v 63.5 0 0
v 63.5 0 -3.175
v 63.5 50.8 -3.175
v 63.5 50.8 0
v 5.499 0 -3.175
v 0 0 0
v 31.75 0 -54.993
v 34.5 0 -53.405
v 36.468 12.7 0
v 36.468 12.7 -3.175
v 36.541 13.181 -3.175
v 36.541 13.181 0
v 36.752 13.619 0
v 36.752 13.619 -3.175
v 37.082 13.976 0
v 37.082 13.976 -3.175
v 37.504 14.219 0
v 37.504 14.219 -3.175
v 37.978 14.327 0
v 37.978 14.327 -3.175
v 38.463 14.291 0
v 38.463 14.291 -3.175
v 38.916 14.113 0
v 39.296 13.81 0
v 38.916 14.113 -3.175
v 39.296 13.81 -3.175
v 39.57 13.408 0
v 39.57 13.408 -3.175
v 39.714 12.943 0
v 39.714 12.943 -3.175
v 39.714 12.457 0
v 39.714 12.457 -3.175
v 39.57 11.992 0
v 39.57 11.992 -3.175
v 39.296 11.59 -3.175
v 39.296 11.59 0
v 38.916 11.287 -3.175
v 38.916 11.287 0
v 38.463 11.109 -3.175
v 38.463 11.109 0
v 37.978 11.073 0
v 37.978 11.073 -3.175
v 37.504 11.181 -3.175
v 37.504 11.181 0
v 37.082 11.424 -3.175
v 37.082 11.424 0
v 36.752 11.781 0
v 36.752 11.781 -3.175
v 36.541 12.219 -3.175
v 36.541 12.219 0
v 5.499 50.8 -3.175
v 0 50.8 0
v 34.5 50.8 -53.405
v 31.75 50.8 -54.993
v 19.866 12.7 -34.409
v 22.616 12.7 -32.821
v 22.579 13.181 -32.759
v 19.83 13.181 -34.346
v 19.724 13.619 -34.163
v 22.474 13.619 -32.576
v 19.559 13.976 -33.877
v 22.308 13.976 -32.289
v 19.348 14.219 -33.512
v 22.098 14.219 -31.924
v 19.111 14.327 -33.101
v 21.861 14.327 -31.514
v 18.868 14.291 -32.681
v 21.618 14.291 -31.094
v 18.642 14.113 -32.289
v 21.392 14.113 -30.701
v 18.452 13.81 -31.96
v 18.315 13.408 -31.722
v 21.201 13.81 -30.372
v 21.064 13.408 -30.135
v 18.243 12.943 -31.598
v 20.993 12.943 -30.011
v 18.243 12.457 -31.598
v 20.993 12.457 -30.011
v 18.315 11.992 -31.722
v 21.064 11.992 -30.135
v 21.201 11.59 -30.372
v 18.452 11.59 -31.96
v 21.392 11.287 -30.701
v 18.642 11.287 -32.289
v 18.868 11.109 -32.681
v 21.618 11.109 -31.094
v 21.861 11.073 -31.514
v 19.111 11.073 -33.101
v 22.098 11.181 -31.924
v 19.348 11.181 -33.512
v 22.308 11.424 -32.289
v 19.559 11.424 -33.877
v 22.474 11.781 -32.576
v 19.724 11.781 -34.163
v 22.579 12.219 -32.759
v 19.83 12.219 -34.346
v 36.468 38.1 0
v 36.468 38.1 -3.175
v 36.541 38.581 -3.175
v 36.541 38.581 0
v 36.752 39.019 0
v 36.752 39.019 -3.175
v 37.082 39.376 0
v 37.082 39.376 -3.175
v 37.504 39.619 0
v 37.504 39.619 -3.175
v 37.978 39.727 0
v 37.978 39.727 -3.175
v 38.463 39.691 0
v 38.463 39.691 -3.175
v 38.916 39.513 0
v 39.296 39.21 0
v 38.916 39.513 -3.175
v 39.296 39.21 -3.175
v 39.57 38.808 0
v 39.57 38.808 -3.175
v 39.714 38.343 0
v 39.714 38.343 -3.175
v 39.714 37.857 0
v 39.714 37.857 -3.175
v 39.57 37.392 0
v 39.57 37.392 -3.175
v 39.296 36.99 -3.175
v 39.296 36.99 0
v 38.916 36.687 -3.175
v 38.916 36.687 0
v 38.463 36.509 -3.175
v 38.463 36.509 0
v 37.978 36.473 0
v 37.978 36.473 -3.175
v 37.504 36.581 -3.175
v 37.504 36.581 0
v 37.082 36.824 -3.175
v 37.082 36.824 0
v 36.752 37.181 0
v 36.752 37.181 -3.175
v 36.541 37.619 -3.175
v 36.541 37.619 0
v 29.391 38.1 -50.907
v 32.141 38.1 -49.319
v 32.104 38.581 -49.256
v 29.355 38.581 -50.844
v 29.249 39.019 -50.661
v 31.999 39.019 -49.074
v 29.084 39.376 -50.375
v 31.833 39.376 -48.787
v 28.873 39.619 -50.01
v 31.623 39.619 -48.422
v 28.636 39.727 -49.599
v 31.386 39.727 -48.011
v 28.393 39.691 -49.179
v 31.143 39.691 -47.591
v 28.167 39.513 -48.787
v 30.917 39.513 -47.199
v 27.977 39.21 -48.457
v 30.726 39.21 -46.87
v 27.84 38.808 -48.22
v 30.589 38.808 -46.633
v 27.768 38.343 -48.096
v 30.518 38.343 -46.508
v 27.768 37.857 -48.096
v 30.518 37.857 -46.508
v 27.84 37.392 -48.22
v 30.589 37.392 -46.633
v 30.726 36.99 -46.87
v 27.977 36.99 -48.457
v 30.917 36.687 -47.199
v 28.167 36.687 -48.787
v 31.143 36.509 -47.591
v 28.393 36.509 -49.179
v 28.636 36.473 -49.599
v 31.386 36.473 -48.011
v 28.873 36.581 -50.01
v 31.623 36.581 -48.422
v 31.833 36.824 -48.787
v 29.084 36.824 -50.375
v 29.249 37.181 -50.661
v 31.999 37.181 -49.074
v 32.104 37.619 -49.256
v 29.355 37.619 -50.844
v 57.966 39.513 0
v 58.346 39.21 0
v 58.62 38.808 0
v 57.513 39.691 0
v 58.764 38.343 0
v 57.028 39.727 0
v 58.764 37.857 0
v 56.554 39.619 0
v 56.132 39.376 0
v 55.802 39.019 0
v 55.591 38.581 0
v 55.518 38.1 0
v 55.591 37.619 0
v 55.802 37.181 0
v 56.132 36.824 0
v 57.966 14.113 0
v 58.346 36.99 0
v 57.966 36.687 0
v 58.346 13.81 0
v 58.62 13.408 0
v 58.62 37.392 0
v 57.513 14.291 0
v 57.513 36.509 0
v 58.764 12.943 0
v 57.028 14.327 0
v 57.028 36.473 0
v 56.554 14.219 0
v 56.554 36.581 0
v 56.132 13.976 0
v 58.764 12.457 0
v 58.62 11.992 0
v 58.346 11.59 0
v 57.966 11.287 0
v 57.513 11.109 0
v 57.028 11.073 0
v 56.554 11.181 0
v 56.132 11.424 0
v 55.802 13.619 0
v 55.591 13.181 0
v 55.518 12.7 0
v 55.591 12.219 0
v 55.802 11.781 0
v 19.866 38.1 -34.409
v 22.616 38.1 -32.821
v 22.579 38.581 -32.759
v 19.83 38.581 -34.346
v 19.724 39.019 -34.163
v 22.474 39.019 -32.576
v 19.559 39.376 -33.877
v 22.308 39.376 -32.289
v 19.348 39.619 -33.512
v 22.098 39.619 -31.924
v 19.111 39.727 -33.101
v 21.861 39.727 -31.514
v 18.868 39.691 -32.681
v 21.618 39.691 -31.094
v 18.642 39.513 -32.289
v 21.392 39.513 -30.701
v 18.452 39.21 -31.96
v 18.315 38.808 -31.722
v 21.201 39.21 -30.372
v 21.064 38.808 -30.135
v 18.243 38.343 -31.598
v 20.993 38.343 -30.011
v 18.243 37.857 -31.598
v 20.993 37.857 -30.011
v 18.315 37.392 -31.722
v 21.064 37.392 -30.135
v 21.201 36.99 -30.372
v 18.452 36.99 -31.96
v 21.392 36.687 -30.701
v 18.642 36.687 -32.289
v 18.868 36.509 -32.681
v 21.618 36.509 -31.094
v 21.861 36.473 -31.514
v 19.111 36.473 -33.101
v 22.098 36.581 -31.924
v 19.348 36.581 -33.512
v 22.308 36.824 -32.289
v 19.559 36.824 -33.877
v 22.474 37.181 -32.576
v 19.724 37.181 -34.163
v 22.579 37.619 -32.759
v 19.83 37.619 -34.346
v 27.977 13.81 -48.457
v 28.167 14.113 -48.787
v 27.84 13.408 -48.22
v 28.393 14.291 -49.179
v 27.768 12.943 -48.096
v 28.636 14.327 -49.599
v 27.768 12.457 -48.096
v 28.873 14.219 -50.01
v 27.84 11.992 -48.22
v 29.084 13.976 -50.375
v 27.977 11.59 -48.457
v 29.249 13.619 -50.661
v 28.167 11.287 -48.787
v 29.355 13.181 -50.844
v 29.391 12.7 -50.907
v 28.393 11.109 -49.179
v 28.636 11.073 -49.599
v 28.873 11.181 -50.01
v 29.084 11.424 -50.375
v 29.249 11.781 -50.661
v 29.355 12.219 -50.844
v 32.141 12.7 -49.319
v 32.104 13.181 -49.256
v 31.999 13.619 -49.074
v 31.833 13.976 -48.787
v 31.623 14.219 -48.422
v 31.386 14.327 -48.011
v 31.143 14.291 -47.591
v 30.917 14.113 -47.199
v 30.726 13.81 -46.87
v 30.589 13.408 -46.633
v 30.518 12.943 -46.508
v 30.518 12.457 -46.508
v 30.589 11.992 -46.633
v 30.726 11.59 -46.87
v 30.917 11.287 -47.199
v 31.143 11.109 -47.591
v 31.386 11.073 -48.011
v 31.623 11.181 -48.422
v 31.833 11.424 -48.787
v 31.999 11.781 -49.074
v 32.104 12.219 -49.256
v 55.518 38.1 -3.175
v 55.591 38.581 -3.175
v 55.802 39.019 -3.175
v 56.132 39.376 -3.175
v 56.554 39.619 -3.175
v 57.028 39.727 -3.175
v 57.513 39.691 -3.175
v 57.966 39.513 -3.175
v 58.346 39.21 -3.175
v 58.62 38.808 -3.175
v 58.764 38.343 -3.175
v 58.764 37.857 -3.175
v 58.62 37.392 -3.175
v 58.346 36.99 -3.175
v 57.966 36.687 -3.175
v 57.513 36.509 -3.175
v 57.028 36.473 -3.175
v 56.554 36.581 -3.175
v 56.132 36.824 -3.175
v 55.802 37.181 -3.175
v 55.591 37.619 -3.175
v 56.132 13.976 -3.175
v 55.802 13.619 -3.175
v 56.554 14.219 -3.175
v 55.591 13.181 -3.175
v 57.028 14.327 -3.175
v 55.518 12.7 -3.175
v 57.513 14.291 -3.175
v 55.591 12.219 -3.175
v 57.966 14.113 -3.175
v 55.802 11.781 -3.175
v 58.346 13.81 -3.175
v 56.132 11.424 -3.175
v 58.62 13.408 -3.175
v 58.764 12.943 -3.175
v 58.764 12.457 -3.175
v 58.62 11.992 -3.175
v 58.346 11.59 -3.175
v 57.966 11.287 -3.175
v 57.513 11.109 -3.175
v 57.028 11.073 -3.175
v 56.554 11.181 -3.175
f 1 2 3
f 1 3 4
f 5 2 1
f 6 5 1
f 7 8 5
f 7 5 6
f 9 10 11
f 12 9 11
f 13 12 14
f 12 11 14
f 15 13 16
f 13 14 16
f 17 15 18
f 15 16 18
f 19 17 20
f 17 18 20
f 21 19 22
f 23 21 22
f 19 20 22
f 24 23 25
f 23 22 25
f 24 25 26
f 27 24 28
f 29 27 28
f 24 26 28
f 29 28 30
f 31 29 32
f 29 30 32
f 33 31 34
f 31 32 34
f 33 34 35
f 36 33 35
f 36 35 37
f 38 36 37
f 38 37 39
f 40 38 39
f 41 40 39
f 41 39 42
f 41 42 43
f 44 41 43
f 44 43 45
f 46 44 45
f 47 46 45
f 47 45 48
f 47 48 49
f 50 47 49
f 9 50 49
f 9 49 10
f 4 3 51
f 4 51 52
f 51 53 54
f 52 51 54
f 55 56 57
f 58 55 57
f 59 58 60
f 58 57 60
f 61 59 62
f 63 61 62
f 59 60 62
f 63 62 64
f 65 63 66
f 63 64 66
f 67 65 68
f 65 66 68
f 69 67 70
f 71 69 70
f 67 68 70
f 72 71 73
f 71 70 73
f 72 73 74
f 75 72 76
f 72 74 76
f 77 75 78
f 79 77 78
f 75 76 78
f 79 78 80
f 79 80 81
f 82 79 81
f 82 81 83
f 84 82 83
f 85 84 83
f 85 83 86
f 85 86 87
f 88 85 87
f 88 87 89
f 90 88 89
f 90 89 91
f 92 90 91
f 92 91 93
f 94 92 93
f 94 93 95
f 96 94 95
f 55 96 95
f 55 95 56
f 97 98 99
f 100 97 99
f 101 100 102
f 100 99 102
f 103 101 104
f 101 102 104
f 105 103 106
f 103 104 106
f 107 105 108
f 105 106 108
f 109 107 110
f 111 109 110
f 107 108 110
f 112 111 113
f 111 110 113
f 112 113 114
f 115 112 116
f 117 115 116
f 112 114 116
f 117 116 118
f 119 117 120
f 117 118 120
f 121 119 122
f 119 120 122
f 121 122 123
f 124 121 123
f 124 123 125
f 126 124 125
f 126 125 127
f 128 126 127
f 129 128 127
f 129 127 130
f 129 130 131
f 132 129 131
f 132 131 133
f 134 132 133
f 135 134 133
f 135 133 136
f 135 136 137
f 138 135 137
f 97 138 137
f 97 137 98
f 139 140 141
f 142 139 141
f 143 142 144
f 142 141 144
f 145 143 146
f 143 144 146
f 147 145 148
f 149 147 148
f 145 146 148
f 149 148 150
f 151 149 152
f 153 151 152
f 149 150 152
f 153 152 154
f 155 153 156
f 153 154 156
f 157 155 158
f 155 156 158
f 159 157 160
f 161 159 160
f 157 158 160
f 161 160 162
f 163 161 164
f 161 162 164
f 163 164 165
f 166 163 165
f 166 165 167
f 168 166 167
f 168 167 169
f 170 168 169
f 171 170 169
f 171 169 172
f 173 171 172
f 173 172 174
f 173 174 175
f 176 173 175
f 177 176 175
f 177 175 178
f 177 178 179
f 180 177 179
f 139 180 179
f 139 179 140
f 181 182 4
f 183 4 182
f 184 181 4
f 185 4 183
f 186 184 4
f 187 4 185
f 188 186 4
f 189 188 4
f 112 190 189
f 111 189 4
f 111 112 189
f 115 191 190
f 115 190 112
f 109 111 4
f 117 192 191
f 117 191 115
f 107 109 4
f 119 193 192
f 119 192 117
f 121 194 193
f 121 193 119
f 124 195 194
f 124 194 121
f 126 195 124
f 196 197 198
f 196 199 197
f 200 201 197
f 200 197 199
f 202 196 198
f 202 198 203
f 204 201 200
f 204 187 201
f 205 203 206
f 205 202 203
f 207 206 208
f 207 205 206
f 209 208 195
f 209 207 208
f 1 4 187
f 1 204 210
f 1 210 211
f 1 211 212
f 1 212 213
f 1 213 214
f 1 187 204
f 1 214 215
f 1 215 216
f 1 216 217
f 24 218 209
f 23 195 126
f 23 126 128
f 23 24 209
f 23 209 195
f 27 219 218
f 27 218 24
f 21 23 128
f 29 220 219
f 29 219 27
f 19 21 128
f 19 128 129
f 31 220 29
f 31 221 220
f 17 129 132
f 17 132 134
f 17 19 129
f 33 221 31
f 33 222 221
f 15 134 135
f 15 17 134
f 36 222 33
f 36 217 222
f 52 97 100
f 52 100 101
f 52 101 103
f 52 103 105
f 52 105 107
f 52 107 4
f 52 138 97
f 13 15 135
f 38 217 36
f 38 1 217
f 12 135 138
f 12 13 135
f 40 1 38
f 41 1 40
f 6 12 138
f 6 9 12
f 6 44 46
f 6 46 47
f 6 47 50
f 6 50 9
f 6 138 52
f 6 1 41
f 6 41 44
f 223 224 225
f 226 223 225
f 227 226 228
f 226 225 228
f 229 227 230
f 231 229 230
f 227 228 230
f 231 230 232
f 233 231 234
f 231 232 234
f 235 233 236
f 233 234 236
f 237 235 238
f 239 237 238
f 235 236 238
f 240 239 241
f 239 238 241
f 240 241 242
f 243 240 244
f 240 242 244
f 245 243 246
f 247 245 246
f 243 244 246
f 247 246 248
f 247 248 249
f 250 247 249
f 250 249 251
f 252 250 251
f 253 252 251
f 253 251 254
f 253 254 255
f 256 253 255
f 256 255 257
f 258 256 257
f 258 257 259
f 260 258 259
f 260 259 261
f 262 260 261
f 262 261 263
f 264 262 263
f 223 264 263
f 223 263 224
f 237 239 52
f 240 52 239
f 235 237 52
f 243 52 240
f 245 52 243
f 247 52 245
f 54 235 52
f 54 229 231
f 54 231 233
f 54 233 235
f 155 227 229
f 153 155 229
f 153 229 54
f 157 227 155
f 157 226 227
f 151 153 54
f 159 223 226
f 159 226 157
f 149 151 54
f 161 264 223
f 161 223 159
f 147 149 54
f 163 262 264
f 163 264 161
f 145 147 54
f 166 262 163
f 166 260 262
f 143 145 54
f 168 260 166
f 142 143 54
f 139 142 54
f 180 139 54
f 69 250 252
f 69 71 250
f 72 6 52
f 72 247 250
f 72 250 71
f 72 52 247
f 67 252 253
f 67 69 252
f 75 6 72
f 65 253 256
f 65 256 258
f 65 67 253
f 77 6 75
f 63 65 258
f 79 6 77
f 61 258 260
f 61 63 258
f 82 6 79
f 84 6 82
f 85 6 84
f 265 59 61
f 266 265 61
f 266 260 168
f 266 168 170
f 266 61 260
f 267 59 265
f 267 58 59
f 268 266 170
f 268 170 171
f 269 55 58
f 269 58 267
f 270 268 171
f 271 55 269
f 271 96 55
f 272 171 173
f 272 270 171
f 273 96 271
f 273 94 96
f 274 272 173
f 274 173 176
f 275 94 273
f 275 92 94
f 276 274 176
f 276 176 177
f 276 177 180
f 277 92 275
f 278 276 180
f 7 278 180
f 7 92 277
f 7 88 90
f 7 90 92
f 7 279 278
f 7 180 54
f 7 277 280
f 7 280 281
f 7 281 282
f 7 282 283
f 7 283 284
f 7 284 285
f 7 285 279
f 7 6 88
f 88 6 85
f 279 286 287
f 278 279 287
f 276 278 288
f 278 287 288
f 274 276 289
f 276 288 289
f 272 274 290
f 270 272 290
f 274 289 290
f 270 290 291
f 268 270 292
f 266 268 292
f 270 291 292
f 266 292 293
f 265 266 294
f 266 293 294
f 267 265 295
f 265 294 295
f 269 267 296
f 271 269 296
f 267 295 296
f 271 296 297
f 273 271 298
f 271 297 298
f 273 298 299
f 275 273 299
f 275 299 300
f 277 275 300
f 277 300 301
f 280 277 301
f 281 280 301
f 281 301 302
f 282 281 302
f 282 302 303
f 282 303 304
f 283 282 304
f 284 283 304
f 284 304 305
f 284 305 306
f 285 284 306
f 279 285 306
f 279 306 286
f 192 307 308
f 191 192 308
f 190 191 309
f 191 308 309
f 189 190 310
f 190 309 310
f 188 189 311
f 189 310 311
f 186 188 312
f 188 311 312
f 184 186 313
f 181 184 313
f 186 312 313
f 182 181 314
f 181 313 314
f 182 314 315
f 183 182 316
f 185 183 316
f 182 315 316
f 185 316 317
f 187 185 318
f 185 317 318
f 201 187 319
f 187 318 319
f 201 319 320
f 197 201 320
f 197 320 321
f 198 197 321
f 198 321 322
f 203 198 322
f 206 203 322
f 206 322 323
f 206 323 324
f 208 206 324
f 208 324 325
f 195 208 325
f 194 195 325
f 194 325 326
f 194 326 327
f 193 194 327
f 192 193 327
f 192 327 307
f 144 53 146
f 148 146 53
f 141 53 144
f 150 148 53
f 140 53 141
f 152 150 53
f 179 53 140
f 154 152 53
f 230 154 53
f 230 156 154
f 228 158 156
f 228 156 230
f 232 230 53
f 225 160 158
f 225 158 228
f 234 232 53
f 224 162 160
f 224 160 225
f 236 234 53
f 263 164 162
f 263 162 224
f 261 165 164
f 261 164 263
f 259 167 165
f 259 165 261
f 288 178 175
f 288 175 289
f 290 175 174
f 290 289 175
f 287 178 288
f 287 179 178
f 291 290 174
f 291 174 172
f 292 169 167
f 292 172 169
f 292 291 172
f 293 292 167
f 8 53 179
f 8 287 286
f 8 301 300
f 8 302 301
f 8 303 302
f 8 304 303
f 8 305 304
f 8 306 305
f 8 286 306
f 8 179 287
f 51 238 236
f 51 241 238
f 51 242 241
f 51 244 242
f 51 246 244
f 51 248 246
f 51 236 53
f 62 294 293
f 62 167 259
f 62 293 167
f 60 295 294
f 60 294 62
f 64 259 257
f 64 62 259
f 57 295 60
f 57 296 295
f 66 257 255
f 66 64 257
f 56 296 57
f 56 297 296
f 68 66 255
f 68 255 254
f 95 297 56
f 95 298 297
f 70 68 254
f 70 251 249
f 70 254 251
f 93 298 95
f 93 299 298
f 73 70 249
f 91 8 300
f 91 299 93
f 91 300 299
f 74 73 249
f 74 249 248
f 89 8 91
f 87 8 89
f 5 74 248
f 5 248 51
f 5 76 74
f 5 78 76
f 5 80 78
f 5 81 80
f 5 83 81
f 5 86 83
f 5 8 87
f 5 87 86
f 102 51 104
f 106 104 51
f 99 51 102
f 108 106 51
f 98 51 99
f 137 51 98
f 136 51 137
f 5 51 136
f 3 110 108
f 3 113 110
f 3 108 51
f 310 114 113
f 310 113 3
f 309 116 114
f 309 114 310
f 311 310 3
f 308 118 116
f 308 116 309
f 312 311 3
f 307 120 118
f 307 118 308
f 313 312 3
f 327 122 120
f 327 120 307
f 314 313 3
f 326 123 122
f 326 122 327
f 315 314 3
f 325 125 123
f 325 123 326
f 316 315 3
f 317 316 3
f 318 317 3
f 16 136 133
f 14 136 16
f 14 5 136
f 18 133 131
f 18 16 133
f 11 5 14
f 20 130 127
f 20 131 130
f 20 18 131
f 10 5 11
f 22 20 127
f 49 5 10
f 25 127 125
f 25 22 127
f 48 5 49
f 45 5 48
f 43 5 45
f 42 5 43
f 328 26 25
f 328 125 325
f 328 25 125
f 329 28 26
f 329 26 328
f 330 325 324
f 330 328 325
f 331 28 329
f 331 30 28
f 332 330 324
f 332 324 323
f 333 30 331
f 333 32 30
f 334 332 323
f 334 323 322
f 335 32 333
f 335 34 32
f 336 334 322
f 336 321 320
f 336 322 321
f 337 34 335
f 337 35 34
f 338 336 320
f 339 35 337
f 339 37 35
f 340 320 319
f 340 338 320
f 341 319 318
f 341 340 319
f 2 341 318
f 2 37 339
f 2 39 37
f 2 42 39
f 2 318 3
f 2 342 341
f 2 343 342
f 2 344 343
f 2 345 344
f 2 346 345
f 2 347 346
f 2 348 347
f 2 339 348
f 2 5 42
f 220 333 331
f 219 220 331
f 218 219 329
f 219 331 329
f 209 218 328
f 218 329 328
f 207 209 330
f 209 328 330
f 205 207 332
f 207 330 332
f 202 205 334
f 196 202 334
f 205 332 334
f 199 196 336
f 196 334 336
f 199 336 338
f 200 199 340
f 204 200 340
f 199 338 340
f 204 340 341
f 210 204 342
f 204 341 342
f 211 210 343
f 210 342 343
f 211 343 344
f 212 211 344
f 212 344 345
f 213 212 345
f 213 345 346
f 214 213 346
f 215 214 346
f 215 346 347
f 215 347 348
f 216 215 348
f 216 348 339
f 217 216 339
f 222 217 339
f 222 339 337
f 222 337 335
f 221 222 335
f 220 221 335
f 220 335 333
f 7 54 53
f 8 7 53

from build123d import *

# Parameters (mm, degrees)
BOSS_EXTRUDE1_DEPTH              = 50.8
F_30_0_1285_DIAMETER_HOLE1_D     = 3.2639
F_30_0_1285_DIAMETER_HOLE2_D     = 3.2639
F_30_0_1285_DIAMETER_HOLE2_DEPTH = 25.4
F_30_0_1285_DIAMETER_HOLE2_TIP   = 0.980574487


with BuildPart() as part:
    # Sketch1 → Boss-Extrude1 (new body)
    with BuildSketch(Plane(origin=(0, 0, 0), x_dir=(1, 0, 0), z_dir=(0, 1, 0))):
        Polygon((0, 0), (31.75, 54.99261314), (34.499630657, 53.40511314), (5.499261314, 3.175), (63.5, 3.175), (63.5, 0), align=None)
    extrude(amount=BOSS_EXTRUDE1_DEPTH)

    # #30 (0.1285) Diameter Hole1 (through all)
    with Locations(Plane.XY):
        with Locations((57.15, 12.7), (57.15, 38.1), (38.1, 38.1), (38.1, 12.7)):
            Hole(F_30_0_1285_DIAMETER_HOLE1_D / 2)

    # #30 (0.1285) Diameter Hole2
    with Locations(Plane(origin=(0, 0, 0), x_dir=(-0.5000000000000039, 0, 0.8660254037844365), z_dir=(-0.8660254037844364, 0, -0.5000000000000038))):
        with Locations((-57.15, 38.1), (-57.15, 12.7), (-38.1, 12.7), (-38.1, 38.1)):
            Hole(F_30_0_1285_DIAMETER_HOLE2_D / 2, depth=F_30_0_1285_DIAMETER_HOLE2_DEPTH)
            with Locations((0, 0, -(F_30_0_1285_DIAMETER_HOLE2_DEPTH + F_30_0_1285_DIAMETER_HOLE2_TIP / 2))):  # 118° drill point
                Cone(0, F_30_0_1285_DIAMETER_HOLE2_D / 2, F_30_0_1285_DIAMETER_HOLE2_TIP, mode=Mode.SUBTRACT)


solid = part.part
